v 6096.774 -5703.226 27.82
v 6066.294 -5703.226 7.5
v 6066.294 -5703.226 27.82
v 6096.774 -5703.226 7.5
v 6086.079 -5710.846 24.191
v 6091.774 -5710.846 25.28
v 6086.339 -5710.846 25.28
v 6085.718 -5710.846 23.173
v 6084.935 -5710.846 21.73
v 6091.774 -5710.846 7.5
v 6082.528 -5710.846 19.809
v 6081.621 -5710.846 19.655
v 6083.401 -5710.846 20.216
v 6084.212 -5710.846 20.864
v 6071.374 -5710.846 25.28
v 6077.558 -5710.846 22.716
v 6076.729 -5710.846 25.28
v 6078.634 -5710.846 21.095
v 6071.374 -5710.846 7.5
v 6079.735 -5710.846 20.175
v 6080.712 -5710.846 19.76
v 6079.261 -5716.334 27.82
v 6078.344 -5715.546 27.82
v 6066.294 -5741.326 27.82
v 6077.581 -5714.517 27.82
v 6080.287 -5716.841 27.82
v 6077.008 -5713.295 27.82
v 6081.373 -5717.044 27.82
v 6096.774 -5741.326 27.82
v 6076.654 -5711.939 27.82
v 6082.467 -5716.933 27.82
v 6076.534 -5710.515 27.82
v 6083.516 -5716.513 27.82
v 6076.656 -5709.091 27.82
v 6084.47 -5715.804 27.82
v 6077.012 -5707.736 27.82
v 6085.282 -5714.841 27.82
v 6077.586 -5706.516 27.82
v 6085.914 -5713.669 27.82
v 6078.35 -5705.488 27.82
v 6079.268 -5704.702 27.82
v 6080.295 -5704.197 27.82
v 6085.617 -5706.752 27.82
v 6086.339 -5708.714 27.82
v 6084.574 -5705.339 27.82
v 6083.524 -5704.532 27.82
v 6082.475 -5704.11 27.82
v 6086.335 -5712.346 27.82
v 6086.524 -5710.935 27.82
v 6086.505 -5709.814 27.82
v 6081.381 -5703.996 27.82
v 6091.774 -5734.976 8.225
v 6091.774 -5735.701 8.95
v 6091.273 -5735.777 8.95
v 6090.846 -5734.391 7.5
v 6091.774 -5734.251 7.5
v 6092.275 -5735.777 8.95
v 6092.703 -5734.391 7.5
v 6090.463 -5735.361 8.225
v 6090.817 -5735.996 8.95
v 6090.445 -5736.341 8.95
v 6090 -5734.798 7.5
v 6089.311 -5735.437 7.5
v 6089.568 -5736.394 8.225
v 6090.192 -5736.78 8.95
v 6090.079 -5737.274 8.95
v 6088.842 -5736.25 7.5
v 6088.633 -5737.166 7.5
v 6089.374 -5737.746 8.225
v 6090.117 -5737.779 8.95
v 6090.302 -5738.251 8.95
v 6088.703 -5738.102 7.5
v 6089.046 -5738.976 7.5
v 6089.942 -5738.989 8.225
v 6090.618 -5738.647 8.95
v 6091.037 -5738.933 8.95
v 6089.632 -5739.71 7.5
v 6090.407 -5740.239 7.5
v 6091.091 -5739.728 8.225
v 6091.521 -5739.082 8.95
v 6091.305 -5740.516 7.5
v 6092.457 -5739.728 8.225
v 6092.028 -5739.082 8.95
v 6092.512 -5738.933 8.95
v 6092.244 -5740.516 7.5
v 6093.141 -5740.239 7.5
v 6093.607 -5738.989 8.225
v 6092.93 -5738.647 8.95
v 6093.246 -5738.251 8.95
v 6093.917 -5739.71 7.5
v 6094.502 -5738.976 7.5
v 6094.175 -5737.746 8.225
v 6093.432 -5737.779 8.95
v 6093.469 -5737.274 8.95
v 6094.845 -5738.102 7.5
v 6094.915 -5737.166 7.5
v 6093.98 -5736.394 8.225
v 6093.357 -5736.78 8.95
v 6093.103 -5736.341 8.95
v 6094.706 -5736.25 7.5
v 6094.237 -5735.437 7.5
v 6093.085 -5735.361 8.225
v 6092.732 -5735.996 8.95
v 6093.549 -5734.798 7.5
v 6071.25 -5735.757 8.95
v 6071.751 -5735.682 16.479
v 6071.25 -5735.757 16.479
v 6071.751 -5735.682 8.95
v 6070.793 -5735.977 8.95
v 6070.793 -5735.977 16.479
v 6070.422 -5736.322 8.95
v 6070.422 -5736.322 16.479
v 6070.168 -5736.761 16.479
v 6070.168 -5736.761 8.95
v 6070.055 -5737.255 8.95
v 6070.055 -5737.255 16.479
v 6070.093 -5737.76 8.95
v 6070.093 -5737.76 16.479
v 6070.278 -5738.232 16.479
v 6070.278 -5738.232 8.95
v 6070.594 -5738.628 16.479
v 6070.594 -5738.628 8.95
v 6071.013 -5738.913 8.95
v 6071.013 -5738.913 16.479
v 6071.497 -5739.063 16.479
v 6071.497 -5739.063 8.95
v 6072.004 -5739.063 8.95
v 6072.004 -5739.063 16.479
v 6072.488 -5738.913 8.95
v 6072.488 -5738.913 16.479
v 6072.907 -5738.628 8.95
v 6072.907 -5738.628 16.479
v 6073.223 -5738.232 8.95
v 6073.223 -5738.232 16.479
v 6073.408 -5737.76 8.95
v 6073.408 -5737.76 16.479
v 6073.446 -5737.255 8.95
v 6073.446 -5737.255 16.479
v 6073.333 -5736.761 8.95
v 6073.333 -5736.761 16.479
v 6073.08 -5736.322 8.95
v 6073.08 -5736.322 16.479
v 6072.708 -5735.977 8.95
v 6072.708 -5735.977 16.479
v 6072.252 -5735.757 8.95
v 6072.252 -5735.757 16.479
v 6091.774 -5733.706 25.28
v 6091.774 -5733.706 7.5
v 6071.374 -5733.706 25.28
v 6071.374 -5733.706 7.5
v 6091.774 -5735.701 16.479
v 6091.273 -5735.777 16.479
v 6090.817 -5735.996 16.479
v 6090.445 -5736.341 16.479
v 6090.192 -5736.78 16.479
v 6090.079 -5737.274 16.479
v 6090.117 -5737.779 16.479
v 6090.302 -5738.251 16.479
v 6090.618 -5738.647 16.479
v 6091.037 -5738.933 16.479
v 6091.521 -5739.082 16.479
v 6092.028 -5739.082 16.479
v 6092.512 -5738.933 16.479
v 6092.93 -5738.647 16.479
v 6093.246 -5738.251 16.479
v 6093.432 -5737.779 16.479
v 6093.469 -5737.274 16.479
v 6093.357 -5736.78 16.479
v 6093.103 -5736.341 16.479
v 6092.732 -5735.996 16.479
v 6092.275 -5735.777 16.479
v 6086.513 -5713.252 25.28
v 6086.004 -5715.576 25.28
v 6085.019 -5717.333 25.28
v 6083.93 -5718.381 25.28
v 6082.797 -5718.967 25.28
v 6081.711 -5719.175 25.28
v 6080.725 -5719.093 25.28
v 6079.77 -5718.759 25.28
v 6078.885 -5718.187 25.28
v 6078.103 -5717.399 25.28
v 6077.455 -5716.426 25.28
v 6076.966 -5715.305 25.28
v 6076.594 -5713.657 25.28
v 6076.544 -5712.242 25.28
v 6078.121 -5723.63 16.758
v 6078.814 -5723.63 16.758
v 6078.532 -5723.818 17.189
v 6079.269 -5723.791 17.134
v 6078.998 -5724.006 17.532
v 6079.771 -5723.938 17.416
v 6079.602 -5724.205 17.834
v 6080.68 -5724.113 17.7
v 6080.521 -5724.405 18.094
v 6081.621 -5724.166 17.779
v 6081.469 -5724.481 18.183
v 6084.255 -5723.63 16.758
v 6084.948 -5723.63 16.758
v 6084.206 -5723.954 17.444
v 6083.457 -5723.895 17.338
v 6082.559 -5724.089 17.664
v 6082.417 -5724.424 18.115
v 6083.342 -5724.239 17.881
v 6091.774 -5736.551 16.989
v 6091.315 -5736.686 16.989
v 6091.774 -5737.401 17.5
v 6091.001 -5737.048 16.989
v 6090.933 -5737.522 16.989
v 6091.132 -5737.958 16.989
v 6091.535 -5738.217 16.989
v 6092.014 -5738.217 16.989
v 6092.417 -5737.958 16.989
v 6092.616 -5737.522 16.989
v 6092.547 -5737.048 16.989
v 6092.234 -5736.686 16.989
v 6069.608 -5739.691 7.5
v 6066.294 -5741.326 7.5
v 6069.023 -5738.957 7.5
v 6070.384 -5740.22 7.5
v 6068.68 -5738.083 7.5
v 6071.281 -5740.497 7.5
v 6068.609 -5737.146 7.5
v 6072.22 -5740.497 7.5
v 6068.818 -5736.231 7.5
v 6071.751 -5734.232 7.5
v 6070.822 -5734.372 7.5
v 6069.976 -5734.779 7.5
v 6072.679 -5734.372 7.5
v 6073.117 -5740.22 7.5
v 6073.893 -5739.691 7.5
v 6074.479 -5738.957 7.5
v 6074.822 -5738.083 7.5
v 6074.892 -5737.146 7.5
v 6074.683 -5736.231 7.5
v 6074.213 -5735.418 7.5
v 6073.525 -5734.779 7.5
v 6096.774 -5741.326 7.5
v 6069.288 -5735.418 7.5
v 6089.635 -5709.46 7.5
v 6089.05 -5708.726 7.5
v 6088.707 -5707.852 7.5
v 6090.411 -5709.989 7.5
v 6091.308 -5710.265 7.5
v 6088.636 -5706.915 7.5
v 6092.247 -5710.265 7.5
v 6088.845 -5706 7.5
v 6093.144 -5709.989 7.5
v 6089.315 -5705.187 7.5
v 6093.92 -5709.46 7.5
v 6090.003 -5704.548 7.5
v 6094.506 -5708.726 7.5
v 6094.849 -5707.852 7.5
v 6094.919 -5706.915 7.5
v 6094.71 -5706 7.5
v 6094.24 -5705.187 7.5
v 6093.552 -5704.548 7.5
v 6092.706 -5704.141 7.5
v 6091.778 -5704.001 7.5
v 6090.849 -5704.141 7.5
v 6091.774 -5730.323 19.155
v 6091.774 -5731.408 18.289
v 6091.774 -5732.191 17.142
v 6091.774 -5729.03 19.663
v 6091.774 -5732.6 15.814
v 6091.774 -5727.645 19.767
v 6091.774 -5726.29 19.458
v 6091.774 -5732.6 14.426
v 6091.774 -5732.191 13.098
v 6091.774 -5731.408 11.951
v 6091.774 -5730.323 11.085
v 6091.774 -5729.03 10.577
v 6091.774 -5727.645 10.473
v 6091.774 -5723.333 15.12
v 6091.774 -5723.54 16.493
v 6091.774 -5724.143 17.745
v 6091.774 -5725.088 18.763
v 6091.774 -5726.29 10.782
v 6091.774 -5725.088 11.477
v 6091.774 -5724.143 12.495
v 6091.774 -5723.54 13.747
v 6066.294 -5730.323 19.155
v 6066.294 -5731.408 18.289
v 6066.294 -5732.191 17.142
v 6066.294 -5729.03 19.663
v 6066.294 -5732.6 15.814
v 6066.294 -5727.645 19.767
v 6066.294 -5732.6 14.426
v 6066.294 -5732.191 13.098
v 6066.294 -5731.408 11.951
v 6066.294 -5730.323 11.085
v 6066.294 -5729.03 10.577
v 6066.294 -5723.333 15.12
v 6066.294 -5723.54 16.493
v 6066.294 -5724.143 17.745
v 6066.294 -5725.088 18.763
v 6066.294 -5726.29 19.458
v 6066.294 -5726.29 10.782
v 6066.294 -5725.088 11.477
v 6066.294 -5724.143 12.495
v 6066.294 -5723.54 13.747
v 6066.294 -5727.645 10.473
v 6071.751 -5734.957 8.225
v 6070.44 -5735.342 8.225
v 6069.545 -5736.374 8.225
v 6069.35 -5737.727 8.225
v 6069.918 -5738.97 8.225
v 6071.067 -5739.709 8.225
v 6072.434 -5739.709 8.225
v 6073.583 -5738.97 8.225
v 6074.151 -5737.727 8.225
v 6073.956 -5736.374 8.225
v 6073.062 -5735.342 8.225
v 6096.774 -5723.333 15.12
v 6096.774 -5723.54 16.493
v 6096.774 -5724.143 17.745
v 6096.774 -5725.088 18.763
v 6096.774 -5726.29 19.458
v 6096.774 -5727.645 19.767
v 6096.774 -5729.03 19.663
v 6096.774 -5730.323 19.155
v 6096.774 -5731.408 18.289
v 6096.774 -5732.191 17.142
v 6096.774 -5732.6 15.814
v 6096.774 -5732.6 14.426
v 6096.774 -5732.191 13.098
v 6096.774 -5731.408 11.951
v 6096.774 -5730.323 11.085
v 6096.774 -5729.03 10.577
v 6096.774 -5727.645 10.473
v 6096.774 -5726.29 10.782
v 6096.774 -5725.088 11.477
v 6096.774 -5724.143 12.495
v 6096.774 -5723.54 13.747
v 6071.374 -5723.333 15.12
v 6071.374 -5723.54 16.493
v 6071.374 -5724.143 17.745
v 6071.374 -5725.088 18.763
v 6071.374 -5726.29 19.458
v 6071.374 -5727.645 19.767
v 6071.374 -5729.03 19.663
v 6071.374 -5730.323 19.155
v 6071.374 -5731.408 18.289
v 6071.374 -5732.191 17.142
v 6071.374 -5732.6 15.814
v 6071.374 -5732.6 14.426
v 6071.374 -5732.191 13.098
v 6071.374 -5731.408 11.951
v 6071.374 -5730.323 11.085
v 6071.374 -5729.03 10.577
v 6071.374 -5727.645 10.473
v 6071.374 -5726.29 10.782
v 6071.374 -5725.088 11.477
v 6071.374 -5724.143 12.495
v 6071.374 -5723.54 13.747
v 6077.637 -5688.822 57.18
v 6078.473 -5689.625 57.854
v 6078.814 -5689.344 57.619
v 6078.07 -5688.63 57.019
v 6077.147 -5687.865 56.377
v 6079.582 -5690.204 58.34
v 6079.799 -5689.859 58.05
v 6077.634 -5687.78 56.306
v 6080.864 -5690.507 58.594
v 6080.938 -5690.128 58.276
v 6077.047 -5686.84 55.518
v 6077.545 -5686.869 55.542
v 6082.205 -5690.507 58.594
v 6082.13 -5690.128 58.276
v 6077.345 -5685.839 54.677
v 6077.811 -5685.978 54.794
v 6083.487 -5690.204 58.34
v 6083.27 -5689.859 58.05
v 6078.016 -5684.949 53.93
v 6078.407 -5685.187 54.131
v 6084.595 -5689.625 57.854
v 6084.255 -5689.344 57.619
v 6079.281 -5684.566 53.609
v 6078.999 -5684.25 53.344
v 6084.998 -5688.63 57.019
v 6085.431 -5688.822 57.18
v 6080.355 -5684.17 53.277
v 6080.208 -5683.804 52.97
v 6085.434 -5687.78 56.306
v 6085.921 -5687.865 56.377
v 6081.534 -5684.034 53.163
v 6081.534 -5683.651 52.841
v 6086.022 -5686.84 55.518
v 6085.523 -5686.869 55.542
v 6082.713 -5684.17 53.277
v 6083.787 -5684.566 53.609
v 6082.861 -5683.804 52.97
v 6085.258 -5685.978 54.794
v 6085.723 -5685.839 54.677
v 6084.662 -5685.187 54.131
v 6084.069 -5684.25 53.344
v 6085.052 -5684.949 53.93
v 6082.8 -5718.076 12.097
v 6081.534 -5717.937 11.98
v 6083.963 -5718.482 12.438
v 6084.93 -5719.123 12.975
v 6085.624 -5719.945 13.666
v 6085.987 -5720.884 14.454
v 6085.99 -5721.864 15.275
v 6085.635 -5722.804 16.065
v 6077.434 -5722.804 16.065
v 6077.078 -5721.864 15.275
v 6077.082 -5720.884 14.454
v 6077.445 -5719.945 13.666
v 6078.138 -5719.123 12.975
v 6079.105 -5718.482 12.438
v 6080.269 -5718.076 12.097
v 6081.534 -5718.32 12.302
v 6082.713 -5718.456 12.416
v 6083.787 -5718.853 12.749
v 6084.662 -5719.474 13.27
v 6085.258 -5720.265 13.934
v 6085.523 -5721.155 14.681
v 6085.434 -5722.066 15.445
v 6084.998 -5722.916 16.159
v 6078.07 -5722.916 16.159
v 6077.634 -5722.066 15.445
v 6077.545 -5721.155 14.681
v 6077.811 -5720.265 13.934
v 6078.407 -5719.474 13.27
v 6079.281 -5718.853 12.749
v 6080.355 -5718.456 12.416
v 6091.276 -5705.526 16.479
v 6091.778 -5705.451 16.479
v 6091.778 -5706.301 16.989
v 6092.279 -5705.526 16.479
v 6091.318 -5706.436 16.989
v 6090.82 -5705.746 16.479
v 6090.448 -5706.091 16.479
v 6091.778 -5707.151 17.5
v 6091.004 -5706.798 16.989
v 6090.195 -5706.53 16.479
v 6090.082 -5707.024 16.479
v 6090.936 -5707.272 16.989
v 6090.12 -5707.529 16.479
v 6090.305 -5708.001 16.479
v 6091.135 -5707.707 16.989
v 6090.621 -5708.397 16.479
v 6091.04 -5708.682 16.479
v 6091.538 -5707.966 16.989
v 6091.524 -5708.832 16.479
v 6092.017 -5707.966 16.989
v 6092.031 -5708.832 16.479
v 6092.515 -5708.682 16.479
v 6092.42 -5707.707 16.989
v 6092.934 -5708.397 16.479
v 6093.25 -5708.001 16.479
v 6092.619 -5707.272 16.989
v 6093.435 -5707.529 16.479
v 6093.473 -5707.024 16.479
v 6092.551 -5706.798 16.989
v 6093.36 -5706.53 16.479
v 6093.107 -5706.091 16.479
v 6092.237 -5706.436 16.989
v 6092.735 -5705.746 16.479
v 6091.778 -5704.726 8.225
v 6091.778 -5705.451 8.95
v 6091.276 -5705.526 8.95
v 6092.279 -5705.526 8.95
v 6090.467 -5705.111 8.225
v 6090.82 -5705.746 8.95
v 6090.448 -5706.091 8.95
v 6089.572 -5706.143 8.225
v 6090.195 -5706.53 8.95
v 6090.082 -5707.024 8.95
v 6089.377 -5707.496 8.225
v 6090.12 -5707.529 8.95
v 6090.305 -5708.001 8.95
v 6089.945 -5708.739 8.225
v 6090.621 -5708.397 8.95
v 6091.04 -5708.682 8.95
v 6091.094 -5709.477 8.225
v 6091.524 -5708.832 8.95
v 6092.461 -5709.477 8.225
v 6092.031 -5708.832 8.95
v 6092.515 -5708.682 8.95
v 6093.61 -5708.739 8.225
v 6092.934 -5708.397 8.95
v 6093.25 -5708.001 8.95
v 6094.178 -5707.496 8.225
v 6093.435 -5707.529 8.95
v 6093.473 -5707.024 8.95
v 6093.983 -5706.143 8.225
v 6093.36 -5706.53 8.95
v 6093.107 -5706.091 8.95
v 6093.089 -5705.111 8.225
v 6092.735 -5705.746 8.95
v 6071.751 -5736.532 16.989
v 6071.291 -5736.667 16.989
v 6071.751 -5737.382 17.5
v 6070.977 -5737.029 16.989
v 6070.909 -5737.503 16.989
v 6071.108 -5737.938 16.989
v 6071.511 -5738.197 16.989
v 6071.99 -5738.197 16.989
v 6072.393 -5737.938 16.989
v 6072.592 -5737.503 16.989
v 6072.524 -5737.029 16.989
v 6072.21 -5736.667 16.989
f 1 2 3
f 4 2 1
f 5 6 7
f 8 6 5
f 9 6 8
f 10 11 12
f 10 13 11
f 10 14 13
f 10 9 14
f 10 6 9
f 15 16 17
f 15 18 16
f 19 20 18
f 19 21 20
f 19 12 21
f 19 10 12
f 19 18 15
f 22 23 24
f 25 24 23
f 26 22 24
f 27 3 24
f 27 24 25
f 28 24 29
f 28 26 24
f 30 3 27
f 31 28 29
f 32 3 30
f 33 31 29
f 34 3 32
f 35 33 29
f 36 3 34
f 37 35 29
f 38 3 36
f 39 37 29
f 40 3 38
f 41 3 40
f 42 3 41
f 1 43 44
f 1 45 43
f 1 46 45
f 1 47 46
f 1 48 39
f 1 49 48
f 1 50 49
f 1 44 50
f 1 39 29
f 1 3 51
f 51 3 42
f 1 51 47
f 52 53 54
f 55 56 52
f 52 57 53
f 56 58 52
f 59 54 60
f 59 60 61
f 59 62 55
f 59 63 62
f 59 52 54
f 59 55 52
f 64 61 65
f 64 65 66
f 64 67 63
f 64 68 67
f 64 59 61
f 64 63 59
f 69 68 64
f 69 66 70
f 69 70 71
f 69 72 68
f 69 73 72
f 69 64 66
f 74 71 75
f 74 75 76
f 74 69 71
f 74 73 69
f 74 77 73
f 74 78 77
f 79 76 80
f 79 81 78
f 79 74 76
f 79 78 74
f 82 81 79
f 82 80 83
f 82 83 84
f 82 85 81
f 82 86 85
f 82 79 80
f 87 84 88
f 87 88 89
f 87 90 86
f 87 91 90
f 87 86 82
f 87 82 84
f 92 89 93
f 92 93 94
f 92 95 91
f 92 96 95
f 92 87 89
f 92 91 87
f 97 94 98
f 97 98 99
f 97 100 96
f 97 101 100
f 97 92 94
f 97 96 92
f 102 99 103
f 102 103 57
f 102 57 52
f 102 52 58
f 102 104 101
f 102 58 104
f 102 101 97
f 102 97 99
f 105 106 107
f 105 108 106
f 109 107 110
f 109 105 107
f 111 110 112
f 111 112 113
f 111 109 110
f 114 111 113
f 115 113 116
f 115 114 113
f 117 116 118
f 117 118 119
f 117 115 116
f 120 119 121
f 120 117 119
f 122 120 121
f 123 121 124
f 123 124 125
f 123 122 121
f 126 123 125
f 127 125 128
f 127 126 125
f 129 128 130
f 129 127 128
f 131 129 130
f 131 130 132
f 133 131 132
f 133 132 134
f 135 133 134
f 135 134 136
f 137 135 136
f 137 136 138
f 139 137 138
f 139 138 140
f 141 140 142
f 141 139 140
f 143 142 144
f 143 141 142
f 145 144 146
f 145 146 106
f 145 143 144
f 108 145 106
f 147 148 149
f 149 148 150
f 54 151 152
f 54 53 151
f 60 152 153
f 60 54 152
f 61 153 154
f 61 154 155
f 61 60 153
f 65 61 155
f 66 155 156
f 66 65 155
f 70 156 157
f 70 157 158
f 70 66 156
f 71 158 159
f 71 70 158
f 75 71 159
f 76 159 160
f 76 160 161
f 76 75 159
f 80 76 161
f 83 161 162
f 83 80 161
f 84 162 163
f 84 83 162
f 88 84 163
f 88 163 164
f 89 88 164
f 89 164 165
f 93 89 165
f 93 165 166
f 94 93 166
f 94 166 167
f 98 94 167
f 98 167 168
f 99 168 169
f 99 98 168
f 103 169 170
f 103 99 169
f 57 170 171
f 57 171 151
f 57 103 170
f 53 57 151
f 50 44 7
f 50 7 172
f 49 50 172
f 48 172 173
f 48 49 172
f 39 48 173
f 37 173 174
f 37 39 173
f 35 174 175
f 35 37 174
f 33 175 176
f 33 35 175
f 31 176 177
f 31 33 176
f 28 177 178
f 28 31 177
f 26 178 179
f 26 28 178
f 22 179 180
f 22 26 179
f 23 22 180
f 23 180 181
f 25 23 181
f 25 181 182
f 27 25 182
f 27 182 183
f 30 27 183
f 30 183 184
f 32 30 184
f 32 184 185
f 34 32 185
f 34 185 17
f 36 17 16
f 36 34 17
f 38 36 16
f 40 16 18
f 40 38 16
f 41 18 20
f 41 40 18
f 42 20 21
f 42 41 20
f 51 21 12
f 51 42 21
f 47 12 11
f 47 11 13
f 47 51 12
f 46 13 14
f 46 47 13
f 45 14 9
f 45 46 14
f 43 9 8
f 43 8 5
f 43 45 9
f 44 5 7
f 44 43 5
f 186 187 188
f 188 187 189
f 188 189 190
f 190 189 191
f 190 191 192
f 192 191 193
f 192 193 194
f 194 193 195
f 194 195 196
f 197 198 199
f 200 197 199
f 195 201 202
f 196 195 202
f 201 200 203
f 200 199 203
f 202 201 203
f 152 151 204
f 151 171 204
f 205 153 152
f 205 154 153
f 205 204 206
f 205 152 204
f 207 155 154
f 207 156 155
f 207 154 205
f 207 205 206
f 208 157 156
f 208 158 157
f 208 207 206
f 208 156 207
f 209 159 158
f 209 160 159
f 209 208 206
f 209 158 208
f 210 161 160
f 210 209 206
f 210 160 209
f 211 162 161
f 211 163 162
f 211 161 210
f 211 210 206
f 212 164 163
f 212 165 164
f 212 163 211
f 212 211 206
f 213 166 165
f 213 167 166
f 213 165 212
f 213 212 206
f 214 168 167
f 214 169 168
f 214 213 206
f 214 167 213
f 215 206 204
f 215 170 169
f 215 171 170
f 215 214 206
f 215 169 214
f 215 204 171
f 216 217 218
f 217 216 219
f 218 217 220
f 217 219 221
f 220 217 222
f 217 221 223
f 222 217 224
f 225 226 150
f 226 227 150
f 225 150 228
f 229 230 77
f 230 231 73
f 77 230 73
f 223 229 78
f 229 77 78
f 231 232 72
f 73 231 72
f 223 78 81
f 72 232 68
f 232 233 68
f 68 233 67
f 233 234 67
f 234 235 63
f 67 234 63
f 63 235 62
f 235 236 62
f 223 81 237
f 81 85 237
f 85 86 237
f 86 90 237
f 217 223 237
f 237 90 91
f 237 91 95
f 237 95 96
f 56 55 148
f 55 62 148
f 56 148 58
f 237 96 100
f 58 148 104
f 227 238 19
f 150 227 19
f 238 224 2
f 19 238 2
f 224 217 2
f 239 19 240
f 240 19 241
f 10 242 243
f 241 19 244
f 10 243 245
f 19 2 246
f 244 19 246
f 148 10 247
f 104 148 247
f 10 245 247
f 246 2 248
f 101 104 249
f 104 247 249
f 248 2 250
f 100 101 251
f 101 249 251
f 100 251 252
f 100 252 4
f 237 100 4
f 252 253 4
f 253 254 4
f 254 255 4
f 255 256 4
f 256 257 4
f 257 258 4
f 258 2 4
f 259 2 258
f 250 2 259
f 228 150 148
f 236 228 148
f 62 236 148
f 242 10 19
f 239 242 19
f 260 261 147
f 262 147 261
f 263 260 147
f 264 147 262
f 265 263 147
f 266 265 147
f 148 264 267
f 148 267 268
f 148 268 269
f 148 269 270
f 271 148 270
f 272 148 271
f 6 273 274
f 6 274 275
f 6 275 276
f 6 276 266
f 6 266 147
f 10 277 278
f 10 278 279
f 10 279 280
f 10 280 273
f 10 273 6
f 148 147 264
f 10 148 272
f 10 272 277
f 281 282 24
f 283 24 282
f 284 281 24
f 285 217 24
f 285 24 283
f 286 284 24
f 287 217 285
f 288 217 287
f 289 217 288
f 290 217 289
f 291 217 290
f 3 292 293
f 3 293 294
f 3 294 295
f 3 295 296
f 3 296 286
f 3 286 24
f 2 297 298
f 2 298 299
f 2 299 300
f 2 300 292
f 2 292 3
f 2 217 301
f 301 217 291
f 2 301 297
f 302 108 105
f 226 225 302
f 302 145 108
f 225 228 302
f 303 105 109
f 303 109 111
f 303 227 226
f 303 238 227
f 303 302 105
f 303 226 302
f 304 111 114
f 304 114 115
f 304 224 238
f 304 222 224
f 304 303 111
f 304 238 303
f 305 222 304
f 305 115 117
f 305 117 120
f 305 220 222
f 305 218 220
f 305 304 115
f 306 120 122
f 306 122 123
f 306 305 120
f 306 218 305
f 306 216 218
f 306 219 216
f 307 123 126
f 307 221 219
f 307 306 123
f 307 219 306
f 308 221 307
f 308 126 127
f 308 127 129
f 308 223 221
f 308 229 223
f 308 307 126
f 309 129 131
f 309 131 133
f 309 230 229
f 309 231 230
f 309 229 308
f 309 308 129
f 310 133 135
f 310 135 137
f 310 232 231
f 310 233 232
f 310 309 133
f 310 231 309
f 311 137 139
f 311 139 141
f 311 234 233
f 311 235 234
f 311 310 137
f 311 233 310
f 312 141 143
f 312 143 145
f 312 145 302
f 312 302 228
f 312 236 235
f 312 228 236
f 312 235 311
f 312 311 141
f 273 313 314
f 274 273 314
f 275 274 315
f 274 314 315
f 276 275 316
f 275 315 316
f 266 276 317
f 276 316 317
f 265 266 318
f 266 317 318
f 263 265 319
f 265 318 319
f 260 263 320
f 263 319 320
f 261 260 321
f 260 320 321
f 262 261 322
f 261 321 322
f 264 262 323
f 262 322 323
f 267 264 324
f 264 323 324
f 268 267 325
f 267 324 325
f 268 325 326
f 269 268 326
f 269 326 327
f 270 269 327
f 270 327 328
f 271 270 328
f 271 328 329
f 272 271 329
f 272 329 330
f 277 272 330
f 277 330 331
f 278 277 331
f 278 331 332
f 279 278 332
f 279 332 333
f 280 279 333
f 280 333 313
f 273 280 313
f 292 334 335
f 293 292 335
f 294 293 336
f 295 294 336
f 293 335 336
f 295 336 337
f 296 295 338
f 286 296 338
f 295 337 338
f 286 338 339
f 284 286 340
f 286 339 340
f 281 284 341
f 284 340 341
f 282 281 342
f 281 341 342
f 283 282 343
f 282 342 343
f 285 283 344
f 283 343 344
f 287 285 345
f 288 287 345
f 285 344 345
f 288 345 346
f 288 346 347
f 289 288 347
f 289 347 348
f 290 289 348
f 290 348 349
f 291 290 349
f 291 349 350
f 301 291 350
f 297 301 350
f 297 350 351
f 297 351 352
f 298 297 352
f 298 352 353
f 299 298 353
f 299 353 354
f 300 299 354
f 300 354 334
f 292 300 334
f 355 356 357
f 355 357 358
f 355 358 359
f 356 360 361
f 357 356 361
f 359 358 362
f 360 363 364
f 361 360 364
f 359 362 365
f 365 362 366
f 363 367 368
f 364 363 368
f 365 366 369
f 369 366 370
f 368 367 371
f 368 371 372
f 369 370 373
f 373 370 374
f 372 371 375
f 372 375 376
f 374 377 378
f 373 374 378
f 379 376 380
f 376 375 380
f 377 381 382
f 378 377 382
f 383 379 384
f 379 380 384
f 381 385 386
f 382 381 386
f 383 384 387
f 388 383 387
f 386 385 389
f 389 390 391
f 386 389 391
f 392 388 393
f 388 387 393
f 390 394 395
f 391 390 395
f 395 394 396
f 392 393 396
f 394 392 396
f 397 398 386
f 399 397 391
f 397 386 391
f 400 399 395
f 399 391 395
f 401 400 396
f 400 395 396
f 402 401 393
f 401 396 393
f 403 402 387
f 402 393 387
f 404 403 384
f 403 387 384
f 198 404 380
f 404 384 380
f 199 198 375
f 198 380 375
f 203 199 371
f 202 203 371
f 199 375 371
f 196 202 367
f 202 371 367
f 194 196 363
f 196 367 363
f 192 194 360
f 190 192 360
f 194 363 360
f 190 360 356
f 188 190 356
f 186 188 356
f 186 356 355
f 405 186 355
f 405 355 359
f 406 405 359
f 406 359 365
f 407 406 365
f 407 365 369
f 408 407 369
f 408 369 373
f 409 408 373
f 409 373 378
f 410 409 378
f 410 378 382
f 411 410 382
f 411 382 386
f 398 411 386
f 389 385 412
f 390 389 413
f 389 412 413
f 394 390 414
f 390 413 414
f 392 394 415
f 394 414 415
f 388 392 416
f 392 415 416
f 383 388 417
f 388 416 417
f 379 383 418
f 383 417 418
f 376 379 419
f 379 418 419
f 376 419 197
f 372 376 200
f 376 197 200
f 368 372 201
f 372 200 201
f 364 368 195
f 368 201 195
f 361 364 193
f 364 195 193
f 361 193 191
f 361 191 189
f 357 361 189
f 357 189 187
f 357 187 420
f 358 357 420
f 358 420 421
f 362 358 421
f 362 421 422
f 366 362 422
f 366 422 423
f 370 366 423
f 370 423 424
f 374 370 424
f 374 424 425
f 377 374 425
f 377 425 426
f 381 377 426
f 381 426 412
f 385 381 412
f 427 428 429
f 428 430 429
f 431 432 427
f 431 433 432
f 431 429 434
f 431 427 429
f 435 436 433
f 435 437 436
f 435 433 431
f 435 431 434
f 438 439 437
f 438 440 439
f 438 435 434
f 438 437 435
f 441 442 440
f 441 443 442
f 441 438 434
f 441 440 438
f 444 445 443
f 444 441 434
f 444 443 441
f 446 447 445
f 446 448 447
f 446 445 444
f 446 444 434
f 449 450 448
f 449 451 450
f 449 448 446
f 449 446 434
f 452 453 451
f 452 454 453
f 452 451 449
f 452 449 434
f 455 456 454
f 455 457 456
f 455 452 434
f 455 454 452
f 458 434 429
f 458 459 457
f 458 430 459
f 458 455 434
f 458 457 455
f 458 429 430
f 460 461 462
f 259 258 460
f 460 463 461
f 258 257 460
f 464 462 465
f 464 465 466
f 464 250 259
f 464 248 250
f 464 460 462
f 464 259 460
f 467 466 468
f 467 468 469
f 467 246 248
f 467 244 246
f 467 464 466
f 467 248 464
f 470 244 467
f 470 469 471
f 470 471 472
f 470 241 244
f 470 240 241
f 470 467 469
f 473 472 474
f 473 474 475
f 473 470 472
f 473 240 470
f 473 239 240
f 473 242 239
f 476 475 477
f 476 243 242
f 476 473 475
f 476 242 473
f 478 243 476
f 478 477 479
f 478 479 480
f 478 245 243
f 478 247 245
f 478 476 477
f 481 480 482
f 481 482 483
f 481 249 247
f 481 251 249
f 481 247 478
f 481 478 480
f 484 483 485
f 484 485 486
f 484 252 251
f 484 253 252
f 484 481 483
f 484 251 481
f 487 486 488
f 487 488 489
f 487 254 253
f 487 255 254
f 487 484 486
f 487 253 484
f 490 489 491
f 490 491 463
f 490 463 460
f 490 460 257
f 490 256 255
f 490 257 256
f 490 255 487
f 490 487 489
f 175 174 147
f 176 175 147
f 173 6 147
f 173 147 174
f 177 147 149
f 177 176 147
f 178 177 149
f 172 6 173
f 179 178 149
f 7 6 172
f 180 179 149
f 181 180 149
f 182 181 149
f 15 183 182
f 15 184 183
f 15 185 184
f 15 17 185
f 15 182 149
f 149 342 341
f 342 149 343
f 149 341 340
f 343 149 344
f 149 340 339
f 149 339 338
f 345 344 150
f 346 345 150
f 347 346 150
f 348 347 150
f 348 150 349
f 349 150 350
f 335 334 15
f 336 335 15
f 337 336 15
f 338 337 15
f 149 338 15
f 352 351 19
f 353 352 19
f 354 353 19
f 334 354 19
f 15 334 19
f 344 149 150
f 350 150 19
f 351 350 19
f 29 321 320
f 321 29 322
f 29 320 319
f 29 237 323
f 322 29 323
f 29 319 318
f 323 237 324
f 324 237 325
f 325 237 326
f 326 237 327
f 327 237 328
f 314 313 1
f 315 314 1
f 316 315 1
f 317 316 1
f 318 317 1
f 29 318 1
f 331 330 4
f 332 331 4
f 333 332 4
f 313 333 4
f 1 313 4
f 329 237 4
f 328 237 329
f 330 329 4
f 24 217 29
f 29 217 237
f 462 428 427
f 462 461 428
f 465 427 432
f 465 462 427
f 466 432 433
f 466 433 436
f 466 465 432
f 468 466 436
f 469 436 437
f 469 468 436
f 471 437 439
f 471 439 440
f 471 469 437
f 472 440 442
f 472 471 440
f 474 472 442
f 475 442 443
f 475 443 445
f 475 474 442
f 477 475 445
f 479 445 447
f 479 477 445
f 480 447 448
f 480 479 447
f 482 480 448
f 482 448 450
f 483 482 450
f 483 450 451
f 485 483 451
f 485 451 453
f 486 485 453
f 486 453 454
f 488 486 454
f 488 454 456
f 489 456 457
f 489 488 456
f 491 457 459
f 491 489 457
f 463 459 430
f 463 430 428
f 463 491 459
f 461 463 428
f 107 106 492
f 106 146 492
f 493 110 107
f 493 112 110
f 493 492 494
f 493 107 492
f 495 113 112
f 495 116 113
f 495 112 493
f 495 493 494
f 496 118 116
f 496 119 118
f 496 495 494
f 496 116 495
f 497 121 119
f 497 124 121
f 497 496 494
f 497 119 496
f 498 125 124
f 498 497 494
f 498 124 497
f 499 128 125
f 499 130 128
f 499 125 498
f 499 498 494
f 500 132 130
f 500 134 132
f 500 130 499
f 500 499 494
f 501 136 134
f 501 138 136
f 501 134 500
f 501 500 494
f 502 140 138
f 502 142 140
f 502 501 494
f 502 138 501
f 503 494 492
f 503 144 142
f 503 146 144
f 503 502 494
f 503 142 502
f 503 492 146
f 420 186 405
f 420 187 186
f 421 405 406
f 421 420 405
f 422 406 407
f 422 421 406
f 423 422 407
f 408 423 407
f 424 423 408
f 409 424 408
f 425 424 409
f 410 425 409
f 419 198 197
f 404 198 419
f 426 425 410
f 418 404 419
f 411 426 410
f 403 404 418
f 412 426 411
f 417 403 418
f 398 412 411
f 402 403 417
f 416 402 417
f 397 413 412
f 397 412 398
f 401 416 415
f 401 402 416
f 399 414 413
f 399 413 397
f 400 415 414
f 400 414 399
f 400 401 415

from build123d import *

# Parameters (mm, degrees)
BOSS_EXTRUDE1_START                            = 7.5
SKETCH1_W                                      = 30.48
SKETCH1_H                                      = 38.1
BOSS_EXTRUDE1_DEPTH                            = 20.32
SKETCH2_W                                      = 20.4
SKETCH2_H                                      = 22.86
CUT_EXTRUDE1_DEPTH                             = 17.78
SKETCH5_R                                      = 5
CUT_EXTRUDE2_DEPTH                             = 23
BOSS_EXTRUDE2_DEPTH                            = 21.59
BOSS_EXTRUDE2_DEPTH_BACK                       = 31.75
SKETCH10_R                                     = 4.5
SKETCH11_R                                     = 4
CUT_EXTRUDE6_DEPTH                             = 7540.718926849
CSK_FOR_M3_FLAT_HEAD_MACHINE_SCREW1_AT_2_COUNT = 2
CSK_FOR_M3_FLAT_HEAD_MACHINE_SCREW1_AT_2_PITCH = 36.262943744
CSK_FOR_M3_FLAT_HEAD_MACHINE_SCREW1_AT_3_COUNT = 2
CSK_FOR_M3_FLAT_HEAD_MACHINE_SCREW1_AT_3_PITCH = 30.250374024
SKETCH17_R                                     = 4.659600795
CUT_EXTRUDE7_DEPTH                             = 5742.70602656


with BuildPart() as part:
    # Sketch1 → Boss-Extrude1 (new body)
    with BuildSketch(Plane.XY.offset(BOSS_EXTRUDE1_START)):
        with Locations((6081.534193548, -5722.275806452)):
            Rectangle(SKETCH1_W, SKETCH1_H)
    extrude(amount=BOSS_EXTRUDE1_DEPTH)

    # Sketch2 → Cut-Extrude1 (cut)
    with BuildSketch(Plane(origin=(0, 0, 7.5), x_dir=(-1, 0, 0), z_dir=(0, 0, -1))):
        with Locations((-6081.574193548, -5722.275806452)):
            Rectangle(SKETCH2_W, SKETCH2_H)
    extrude(amount=-CUT_EXTRUDE1_DEPTH, mode=Mode.SUBTRACT)

    # Sketch5 → Cut-Extrude2 (cut)
    with BuildSketch(Plane(origin=(0, -2342.736843325, -2791.965049535), x_dir=(-1, 0, 0), z_dir=(0, -0.6427876096865405, -0.766044443118977))):
        with Locations(Location((-6081.534193548, -4392.394788186, 0), (0, 0, 163.93758294))):
            Circle(SKETCH5_R)
    extrude(amount=CUT_EXTRUDE2_DEPTH, mode=Mode.SUBTRACT)

    # Sketch14 → CSK for M3 Flat Head Machine Screw1 (revolve, cut)
    with BuildSketch(Plane(origin=(6091.777562501, -5707.150620301, 7.5), x_dir=(0, 1, 0), z_dir=(1, 0, 0))):
        Polygon((0, 0), (0, 10), (1.7, 8.978536948), (1.7, 1.45), (3.15, 0), align=None)
    csk_for_m3_flat_head_machine_screw1 = revolve(axis=Axis((6091.777562501, -5707.150620301, 1.15), (0, 0, 1)), mode=Mode.SUBTRACT)

    # CSK for M3 Flat Head Machine Screw1 at 2: CSK for M3 Flat Head Machine Screw1 ×2
    with Locations(*[Vector(-0.5522702954349178, -0.8336651130881205, 0) * (i * CSK_FOR_M3_FLAT_HEAD_MACHINE_SCREW1_AT_2_PITCH) for i in range(1, CSK_FOR_M3_FLAT_HEAD_MACHINE_SCREW1_AT_2_COUNT)]):
        add(csk_for_m3_flat_head_machine_screw1, mode=Mode.SUBTRACT)

    # CSK for M3 Flat Head Machine Screw1 at 3: CSK for M3 Flat Head Machine Screw1 ×2
    with Locations(*[Vector(-0.00011136895503228586, -0.999999993798478, 0) * (i * CSK_FOR_M3_FLAT_HEAD_MACHINE_SCREW1_AT_3_PITCH) for i in range(1, CSK_FOR_M3_FLAT_HEAD_MACHINE_SCREW1_AT_3_COUNT)]):
        add(csk_for_m3_flat_head_machine_screw1, mode=Mode.SUBTRACT)


with BuildPart() as body_2:
    # Sketch10 → Boss-Extrude2 (new, two sides: drawn at the far end of the back side and taken through both)
    with BuildSketch(Plane(origin=(0, -2342.736843325, -2791.965049535), x_dir=(-1, 0, 0), z_dir=(0, -0.6427876096865405, -0.766044443118977)).offset(-BOSS_EXTRUDE2_DEPTH_BACK)):
        with Locations(Location((-6081.534193548, -4392.394788186, 0), (0, 0, 90))):
            Circle(SKETCH10_R)
    extrude(amount=BOSS_EXTRUDE2_DEPTH + BOSS_EXTRUDE2_DEPTH_BACK)

    # Sketch11 → Cut-Extrude6 (cut, through all)
    with BuildSketch(Plane(origin=(0, -2356.614627818, -2808.503949062), x_dir=(1, 0, 0), z_dir=(0, -0.6427876096865406, -0.766044443118977))):
        with Locations(Location((6081.534193548, 4392.394788186, 0), (0, 0, 270))):
            Circle(SKETCH11_R)
    extrude(amount=-CUT_EXTRUDE6_DEPTH, mode=Mode.SUBTRACT)


with BuildPart() as cut_extrude7_tool:
    # Sketch17 → Cut-Extrude7 (new, through all)
    with BuildSketch(Plane(origin=(6096.774193549, 0, 0), x_dir=(0, 0, -1), z_dir=(1, 0, 0))):
        with Locations(Location((-15.12, -5727.992735052, 0), (0, 0, 90))):
            Circle(SKETCH17_R)
    extrude(amount=-CUT_EXTRUDE7_DEPTH)


with BuildPart() as part_1:
    add(part.part)

    # Cut-Extrude7: cut by cut_extrude7_tool
    add(cut_extrude7_tool.part, mode=Mode.SUBTRACT)


with BuildPart() as body_2_1:
    add(body_2.part)

    # Cut-Extrude7: cut by cut_extrude7_tool
    add(cut_extrude7_tool.part, mode=Mode.SUBTRACT)


solid = Compound([part_1.part, body_2_1.part])
